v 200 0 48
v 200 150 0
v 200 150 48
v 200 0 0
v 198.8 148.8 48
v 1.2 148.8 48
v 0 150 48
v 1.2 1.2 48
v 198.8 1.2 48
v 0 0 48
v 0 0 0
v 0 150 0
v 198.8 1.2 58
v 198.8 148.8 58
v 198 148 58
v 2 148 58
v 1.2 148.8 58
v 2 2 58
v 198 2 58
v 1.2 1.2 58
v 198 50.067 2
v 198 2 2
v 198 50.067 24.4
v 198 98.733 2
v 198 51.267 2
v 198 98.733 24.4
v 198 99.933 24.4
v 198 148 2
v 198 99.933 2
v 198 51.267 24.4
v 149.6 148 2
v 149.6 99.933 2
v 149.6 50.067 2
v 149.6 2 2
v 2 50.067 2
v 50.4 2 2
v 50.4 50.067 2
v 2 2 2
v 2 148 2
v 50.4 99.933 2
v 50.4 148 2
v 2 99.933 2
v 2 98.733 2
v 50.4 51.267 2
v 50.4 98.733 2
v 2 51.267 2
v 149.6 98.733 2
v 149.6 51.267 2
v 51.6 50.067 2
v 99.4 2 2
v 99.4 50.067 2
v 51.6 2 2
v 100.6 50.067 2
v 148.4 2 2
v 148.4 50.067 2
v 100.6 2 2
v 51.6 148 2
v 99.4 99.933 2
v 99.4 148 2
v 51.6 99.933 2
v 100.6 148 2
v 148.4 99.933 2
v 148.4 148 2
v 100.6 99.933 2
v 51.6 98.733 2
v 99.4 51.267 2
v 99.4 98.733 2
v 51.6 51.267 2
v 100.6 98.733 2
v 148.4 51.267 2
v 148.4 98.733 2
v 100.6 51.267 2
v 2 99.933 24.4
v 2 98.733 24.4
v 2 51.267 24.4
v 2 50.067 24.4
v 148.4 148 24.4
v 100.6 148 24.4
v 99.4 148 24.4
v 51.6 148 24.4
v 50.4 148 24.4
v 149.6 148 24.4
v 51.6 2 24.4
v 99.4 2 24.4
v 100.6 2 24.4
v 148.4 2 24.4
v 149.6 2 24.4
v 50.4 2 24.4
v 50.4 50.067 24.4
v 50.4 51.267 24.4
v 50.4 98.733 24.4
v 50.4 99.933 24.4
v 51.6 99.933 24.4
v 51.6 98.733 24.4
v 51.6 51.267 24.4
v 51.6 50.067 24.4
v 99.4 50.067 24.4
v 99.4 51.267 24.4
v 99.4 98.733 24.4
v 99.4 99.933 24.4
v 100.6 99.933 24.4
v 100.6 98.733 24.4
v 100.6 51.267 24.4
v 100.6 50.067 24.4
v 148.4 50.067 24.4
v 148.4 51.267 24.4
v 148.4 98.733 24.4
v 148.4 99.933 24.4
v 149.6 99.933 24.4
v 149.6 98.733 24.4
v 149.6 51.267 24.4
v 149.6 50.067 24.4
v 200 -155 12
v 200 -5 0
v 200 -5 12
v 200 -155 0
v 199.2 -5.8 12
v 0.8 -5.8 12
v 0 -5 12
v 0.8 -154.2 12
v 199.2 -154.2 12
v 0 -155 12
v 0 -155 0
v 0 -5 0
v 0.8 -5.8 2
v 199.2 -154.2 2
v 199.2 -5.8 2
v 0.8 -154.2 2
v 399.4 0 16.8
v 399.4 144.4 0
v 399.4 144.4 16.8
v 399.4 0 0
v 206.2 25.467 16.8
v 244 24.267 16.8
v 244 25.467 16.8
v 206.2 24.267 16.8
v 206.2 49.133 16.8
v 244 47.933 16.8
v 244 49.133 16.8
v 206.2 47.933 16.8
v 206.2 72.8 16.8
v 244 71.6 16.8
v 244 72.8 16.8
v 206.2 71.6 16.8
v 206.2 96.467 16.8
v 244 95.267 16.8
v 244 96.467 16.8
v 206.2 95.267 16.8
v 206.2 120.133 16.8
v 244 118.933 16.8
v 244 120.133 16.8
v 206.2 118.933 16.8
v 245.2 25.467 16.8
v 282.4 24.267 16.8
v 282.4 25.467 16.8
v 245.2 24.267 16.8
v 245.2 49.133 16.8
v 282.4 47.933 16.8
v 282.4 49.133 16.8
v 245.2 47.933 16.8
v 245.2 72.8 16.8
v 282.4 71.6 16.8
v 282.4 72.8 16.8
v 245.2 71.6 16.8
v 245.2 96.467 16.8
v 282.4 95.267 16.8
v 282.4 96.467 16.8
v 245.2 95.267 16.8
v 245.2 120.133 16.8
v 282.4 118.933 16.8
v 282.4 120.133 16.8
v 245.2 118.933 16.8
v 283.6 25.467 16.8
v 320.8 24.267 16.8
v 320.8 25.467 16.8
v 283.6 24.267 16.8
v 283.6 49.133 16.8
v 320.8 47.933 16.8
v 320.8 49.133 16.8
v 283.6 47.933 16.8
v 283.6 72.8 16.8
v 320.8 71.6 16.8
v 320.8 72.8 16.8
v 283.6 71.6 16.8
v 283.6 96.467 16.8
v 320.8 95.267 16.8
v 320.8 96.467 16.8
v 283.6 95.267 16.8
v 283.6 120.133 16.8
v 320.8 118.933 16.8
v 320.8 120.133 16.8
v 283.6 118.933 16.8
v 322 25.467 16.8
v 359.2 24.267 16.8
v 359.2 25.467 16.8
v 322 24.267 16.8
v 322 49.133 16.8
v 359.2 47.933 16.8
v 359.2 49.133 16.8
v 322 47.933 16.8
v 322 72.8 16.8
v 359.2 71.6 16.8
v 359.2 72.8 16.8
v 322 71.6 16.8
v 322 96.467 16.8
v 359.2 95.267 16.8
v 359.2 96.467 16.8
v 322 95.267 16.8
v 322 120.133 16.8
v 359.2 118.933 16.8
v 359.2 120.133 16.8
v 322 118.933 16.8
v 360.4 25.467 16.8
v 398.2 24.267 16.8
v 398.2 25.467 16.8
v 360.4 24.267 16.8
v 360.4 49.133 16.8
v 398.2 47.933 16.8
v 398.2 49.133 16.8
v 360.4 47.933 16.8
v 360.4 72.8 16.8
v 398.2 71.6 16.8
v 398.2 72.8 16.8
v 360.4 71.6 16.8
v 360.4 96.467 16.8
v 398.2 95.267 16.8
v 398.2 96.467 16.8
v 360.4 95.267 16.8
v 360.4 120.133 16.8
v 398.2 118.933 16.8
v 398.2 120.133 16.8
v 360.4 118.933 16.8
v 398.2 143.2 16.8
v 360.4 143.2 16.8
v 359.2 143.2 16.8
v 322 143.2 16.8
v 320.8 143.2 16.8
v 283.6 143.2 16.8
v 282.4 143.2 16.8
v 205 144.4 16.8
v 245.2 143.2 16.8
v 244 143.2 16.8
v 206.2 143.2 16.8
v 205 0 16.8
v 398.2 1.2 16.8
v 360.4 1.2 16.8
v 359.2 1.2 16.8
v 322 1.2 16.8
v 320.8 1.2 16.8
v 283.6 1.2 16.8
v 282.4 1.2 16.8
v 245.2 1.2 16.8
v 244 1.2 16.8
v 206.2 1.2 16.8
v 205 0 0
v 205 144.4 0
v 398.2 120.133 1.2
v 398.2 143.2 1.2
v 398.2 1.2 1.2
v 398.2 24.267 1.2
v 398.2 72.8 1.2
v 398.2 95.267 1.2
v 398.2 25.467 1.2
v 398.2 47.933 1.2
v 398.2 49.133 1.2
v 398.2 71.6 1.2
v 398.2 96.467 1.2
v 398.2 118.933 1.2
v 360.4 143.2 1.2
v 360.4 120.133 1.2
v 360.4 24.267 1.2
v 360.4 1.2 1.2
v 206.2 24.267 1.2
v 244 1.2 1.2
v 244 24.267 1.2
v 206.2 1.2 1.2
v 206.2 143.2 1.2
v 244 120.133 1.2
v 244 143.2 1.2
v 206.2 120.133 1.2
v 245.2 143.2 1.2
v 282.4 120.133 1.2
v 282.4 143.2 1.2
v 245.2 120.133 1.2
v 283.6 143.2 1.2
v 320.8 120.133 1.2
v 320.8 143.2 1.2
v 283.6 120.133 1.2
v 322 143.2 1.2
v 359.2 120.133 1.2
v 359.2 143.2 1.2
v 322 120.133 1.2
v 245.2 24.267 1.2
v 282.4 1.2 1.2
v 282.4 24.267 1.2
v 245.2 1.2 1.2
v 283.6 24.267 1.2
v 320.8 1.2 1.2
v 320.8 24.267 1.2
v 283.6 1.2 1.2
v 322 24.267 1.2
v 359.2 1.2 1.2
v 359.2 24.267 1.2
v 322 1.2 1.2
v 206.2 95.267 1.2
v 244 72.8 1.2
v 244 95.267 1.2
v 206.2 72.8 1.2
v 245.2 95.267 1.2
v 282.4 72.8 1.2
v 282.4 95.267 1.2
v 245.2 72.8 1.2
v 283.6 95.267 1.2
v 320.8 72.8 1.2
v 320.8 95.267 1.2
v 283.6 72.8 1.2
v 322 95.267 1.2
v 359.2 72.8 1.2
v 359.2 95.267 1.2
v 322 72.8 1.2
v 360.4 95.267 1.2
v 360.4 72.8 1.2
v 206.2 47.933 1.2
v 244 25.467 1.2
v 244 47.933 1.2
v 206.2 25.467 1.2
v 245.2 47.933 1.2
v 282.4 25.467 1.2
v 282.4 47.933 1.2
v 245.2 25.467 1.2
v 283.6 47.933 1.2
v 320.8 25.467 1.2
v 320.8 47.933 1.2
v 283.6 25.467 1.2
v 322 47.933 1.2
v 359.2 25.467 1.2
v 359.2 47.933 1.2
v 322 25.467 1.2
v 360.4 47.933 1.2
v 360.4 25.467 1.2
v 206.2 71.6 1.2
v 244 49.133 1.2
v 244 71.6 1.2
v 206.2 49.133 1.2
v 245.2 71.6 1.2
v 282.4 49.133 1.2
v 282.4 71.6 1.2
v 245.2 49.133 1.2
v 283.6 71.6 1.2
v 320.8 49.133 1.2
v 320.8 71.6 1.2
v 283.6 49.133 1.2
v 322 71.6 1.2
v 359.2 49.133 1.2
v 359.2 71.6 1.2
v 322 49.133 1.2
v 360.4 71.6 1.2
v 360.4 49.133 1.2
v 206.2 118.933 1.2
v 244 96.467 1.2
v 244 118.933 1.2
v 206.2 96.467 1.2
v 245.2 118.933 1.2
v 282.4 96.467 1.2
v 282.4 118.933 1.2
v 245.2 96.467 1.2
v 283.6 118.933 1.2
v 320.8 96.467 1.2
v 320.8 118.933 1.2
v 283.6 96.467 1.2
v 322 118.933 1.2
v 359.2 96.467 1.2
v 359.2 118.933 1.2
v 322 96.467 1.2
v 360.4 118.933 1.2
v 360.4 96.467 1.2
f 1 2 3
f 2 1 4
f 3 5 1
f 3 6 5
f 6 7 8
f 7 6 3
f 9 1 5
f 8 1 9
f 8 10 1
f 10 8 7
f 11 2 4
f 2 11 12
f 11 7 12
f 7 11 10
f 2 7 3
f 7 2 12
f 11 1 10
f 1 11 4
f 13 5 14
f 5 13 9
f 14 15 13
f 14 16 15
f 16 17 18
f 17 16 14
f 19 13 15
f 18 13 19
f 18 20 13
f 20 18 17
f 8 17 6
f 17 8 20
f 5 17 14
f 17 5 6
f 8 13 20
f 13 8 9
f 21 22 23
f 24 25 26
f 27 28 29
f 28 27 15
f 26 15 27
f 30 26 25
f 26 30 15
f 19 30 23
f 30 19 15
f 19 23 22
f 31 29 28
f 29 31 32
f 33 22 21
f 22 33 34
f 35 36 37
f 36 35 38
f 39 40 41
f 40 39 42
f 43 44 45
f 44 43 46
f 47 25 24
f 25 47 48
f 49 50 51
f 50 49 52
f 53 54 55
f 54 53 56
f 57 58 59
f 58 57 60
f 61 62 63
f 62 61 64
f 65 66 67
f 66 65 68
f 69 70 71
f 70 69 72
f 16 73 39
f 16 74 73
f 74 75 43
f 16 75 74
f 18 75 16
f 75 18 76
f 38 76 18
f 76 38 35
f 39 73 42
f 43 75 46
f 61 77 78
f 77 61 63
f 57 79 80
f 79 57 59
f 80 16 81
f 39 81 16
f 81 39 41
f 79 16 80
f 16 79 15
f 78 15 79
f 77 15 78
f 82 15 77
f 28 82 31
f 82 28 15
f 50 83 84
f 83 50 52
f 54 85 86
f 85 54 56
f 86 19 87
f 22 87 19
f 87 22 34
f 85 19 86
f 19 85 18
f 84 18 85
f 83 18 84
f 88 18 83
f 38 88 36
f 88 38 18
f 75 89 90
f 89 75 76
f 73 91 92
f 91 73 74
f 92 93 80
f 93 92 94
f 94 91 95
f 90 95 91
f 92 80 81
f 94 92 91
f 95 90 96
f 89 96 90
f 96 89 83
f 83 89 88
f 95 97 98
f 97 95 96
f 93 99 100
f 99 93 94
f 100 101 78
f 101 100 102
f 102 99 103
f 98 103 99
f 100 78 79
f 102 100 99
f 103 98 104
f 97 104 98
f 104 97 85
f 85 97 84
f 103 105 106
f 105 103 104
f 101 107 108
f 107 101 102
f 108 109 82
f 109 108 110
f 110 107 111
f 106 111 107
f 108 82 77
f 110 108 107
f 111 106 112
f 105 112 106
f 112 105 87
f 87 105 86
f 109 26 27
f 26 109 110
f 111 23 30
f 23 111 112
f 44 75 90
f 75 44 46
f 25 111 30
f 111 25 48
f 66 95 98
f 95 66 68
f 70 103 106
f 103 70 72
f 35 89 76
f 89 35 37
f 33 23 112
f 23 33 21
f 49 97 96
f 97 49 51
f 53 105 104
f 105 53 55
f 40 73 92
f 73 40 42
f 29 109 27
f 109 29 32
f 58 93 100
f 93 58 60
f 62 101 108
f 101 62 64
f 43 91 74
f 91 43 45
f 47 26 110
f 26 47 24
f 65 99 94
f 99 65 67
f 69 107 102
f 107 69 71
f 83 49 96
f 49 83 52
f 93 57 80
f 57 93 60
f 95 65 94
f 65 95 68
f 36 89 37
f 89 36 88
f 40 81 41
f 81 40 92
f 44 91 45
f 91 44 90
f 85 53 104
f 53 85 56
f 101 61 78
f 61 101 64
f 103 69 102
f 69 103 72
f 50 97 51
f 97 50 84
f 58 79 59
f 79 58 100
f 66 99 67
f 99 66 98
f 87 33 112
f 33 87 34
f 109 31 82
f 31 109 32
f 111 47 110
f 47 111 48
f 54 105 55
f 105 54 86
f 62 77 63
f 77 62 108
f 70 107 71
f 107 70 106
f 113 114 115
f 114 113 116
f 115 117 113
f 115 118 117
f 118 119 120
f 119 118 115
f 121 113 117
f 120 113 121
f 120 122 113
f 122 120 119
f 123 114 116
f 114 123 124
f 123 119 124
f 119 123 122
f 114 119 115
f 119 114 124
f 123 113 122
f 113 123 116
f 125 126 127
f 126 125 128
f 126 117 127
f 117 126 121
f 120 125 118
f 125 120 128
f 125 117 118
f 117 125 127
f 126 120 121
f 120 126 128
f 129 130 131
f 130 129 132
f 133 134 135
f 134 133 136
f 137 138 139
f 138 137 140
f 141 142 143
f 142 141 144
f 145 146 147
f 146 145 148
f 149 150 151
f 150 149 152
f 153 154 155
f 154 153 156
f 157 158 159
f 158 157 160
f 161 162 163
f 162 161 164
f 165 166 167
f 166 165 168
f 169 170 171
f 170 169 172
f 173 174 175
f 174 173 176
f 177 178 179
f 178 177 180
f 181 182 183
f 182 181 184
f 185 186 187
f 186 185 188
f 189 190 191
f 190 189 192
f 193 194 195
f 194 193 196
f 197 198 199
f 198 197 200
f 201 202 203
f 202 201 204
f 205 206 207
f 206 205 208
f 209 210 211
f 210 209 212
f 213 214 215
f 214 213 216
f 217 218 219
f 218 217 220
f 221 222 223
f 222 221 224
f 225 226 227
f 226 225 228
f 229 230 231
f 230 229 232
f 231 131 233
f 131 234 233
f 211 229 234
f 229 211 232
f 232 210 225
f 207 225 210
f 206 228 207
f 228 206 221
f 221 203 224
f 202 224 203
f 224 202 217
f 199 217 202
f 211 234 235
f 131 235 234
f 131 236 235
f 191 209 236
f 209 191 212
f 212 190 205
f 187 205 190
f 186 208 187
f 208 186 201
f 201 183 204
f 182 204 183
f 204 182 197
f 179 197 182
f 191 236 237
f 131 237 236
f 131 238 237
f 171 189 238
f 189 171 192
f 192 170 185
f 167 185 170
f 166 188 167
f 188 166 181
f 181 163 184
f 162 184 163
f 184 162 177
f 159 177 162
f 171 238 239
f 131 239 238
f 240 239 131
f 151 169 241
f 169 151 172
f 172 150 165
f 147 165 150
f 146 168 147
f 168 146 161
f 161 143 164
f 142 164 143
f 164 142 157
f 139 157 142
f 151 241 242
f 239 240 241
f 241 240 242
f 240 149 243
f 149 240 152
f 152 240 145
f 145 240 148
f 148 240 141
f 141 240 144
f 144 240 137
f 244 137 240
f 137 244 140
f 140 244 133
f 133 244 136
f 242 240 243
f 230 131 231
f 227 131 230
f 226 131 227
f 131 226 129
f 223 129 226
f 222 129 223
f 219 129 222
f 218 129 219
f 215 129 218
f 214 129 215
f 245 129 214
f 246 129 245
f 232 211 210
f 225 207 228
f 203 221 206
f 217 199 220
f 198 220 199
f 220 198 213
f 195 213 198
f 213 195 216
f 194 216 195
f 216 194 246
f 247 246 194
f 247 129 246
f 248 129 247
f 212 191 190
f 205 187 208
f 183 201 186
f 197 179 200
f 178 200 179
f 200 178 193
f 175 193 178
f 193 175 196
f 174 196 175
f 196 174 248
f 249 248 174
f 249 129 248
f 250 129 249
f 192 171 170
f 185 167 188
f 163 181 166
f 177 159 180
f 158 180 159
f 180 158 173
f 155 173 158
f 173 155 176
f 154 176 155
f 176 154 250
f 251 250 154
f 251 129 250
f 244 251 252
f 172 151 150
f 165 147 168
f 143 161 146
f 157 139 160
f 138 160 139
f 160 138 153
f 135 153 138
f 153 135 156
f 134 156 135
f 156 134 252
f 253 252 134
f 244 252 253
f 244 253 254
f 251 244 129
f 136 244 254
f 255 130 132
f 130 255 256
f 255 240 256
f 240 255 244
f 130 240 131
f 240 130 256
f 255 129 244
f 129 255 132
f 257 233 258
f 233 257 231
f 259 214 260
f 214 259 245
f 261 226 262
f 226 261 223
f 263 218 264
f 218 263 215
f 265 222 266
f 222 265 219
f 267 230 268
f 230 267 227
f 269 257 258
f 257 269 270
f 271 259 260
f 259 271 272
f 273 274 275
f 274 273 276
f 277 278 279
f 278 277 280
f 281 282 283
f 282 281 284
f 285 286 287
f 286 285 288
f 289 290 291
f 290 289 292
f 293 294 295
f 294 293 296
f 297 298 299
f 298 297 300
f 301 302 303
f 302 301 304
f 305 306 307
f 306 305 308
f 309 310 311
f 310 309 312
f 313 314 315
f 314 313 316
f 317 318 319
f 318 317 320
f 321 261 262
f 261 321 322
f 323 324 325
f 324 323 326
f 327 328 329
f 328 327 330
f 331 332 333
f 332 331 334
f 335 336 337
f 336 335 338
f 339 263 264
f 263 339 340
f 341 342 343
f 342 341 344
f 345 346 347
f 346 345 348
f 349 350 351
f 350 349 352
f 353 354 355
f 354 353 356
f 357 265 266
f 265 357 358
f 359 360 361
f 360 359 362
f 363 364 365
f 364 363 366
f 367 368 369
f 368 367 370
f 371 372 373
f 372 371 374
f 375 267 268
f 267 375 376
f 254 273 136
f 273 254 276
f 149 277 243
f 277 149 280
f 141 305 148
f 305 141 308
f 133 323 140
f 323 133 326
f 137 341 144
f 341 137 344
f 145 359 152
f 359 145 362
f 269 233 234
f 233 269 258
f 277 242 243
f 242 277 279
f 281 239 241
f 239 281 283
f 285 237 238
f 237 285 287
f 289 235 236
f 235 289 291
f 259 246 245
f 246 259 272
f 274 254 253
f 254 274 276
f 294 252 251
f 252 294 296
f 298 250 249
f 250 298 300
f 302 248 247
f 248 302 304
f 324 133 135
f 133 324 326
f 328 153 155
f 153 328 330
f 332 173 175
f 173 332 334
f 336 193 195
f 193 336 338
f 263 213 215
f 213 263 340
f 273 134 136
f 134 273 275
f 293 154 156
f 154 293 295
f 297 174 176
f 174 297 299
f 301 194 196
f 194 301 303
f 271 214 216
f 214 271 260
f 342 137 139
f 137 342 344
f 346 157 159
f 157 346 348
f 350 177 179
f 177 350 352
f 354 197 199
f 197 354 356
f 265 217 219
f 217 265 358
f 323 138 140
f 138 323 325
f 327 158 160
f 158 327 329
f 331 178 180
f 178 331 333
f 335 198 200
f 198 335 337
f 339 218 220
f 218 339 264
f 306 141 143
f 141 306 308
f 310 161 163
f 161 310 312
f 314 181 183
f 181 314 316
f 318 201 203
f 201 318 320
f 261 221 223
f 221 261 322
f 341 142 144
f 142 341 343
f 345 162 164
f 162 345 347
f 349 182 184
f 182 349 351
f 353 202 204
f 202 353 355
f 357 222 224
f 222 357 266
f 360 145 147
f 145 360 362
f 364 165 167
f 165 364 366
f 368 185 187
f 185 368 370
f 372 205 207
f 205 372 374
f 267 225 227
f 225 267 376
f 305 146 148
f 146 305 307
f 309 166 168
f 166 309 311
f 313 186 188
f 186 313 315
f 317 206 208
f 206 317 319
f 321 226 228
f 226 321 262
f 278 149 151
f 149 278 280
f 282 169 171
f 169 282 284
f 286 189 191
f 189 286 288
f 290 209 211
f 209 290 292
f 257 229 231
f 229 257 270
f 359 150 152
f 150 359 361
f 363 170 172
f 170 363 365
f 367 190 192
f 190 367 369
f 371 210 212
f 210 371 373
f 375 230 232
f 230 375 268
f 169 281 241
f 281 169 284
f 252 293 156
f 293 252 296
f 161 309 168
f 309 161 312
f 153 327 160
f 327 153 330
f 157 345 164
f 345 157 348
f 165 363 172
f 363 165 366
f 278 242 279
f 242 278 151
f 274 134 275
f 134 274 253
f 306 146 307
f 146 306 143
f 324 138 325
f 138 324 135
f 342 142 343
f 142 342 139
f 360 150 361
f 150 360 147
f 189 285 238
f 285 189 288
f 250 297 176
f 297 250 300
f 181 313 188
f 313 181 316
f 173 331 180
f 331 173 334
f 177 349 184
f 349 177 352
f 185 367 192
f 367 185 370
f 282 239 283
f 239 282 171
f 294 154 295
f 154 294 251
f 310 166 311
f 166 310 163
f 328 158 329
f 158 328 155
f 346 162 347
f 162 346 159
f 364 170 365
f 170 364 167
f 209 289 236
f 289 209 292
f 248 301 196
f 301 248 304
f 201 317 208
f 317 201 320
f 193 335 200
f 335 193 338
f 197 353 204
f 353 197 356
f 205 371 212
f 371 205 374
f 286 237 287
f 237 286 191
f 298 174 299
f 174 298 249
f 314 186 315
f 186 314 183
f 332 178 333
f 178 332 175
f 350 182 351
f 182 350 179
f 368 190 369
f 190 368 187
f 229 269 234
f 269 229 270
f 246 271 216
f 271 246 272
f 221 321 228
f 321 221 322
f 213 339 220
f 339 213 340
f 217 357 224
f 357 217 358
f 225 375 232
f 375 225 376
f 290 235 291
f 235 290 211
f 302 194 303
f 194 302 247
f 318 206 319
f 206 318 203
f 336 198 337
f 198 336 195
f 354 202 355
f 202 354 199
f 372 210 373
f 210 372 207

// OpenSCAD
//-------------------------------------
// Title:             Box MkII
// Version:        1.1.0
// Date:            2019-05-23
// Designer:      Steve Cooper
//-------------------------------------
//
// Tolerance will need to be amended depending on how accurate the printer is and also how tight a fit is required.  Default values work quite well for my setup.
//Update 1.1.0 - Added option to add corners to support inserts if dividers on base box not being used and to change the layout of the dividers in box and insert

/* [Box Structure] */
// Which one would you like to see?
part = "all"; // [box:Box Only,lid:Lid Only,insert:Insert only,boxandlid:Box and Lid,All:All 3]
//width of whole main box
x = 200;
//depth of whole main box
y = 150;
//height of whole main box
z = 60;
//thickness of outside edge (needs to be thick enough for lip)
edge = 2;
lipw = edge/2;


/* [Lid Details] */
//height of lip
liph = 10;
//Additional internal height above lip
lidaddheight = 0;
//tolerance of the lip join - this is tolerance on each edge
tol = 0.4;
piecetol = tol /2;  //Apply equal tolerance to lid and box

/* [Compartments] */
//Number of x compartments
comp_x = 4;
//Number of y compartments
comp_y = 3;
//Percentage Height of compartments
comp_perc = 40; //[1:1:100]
//Width of compartment borders
comp_border=1.2;
//add insert supports
insertsupports=0;    //  [ 0:No, 1:Yes ]


/* [Insert] */
//Number of x compartments in insert
insert_comp_x = 5;
//Number of y compartments in insert
insert_comp_y = 6;
//Percentage Height of insert compared to base
insert_perc = 30; //[1:1:100]
//Width of insert borders
insert_border=1.2;
//Width of insert dividers
insert_divider=1.2;
//clearance for insert - this is tolerance on each edge
insert_tolerance=0.8;


/* [Box and Insert Custom Divider Layouts] */

//custom layout, set value to 1 if you want that border in place
customboxx=[1];
//For a x=4 and y=3 you would have 8 X values and 9 Y values, set both value to [1] for all borders
customboxy=[1];

//custom insert layout, set value to 1 if you want that border in place
custominsertx=[1];
//For a x=4 and y=3 you would have 8 X values and 9 Y values, set both value to [1] for all borders
custominserty=[1];

/* [Hidden] */
//used to give clean rendering
epsilon = 0.01;
//Adjust box to get true whole box dimensions
boxz = z - (edge+lidaddheight);
//Internal x and y dimensions for compartments
intx = x-2*edge;
intstepx = intx / comp_x;
inty = y-2*edge;
intstepy = inty /comp_y;
intz = (boxz-edge)*(comp_perc/100);
//Internals for insert
insertx= intx-2*insert_tolerance;
insertstepx = (insertx-2*insert_border)/insert_comp_x;
inserty= inty-2*insert_tolerance;
insertstepy = (inserty-2*insert_border)/insert_comp_y;
insertz=(boxz-edge)*(insert_perc/100);


module box(){
difference() 
    {
        union()
        {   
            translate(v=[0,0,0]) 
                {
                    cube(size=[x,y,boxz-liph], center=false);
                }
            translate(v=[lipw+piecetol,lipw+piecetol,0]) 
                {
                    cube(size=[x-(2*(lipw+piecetol)),y-(2*(lipw+piecetol)),boxz], center=false);
                }
        }
        translate(v=[edge,edge,edge]) 
            {
                cube(size=[x-(edge*2),y-(edge*2),boxz-edge+epsilon], center=false);
            }
    }
    
//Custom structures
    if (comp_x>1){
        if (comp_y>1){
            for(y1=[1:comp_y-1],x1=[1:comp_x]){
                count = (y1-1)*comp_x+x1-1;
                if(customboxx[count]==1 || customboxx[count]==undef){
                    translate([(intstepx*(x1-1))+edge-comp_border/2,intstepy*(y1)+edge-comp_border/2,edge]) 
                        cube(size=[intstepx+comp_border,comp_border,intz]);
                }
            }
        }
        else {
            //Need to account for when y comp = 1
            for(x1=[1:comp_x]){
                count = x1-1;
                if(customboxx[count]==1 || customboxx[count]==undef){
                    translate([(intstepx*(x1-1))+edge-comp_border/2,(inty/2)+edge-comp_border/2,edge]) 
                        cube(size=[intstepx+comp_border,comp_border,intz]);
                }
            }
        }
    }

    if (comp_y>1){    
        if(comp_x>1){
            for(x1=[1:comp_x-1],y1=[1:comp_y]){
                count = (x1-1)*comp_y+y1-1;
                if(customboxy[count]==1 || customboxy[count]==undef){
                    translate([(intstepx*(x1))+edge-comp_border/2,intstepy*(y1-1)+edge-comp_border/2,edge]) 
                        cube(size=[comp_border,intstepy+comp_border,intz]);
                }
            }
        }
        else {
            //Need to account for when x comp = 1
            for(y1=[1:comp_y]){
                count = y1-1;
                if(customboxy[count]==1 || customboxy[count]==undef){
                    translate([intstepx/2+edge-comp_border/2,intstepy*(y1-1)+edge-comp_border/2,edge]) 
                        cube(size=[comp_border,intstepy+comp_border,intz]);
                }
            }
        }
    }        

        
    if (insertsupports){
            translate([edge,edge,edge])linear_extrude(height=intz)polygon(points=[[0,0],[0,4],[4,0]]);
            translate([x-edge,edge,edge])rotate([0,0,90])linear_extrude(height=intz)polygon(points=[[0,0],[0,4],[4,0]]);
            translate([x-edge,y-edge,edge])rotate([0,0,180])linear_extrude(height=intz)polygon(points=[[0,0],[0,4],[4,0]]);
            translate([edge,y-edge,edge])rotate([0,0,-90])linear_extrude(height=intz)polygon(points=[[0,0],[0,4],[4,0]]);
    }
    
}

module lid(){
difference()
    {
        //main lid
        translate(v=[0,0,0]) 
                {
                    cube(size=[x,y,liph+edge+lidaddheight], center=false);
                }
       //additional height cutout
       translate(v=[edge,edge,edge]) 
            {
                cube(size=[x-(2*edge),y-(2*edge),lidaddheight+epsilon], center=false);
            }                
         //lip cutout   
         translate(v=[edge-lipw-piecetol,edge-lipw-piecetol,edge+lidaddheight]) 
            {
                cube(size=[x-2*(lipw-piecetol),y-2*(lipw-piecetol),liph+epsilon], center=false);
            }
        }
    }
    
    
module insert(){
difference() 
    {
            translate(v=[0,0,0]) 
                {
                    cube(size=[insertx,inserty,insertz], center=false);
                }
        translate(v=[insert_border,insert_border,insert_border]) 
            {
                cube(size=[insertx-(insert_border*2),inserty-(insert_border*2),insertz-insert_border+epsilon], center=false);
            }
    }
    
 //   if (insert_comp_x>1){
 //       for (i=[1:insert_comp_x-1]){
 //           translate([(insertstepx*i)+insert_border-insert_divider/2,insert_border,0])
 //           cube(size=[insert_divider,inserty-2*insert_border,insertz]);
 //       }
 //       }
 //   if (insert_comp_y>1){        
 //       for (i=[1:insert_comp_y-1]){
 //           translate([insert_border,(insertstepy*i)+insert_border-insert_divider/2,0])
 //           cube(size=[insertx-2*insert_border,insert_divider,insertz]);
  //      }
  //      }   
 
 //Custom structures
    if (insert_comp_x>1){
        if (insert_comp_y>1){
            for(y1=[1:insert_comp_y-1],x1=[1:insert_comp_x]){
                count = (y1-1)*insert_comp_x+x1-1;
                if(custominsertx[count]==1 || custominsertx[count]==undef){
                    translate([(insertstepx*(x1-1))+insert_border-insert_divider/2,insertstepy*(y1)+insert_border-insert_divider/2,insert_border]) 
                        cube(size=[insertstepx+insert_divider,insert_divider,insertz-insert_border]);
                }
            }
        }
        else {
            //Need to account for when y comp = 1
            for(x1=[1:insert_comp_x]){
                count = x1-1;
                if(custominsertx[count]==1 || custominsertx[count]==undef){
                    translate([(insertstepx*(x1-1))+insert_border-insert_divider/2,(inty/2)+insert_border-insert_divider/2,insert_border]) 
                        cube(size=[insertstepx+insert_divider,insert_divider,insertz-insert_border]);
                }
            }
        }
    }

    if (insert_comp_y>1){    
        if(comp_x>1){
            for(x1=[1:insert_comp_x-1],y1=[1:insert_comp_y]){
                count = (x1-1)*insert_comp_y+y1-1;
                if(custominserty[count]==1 || custominserty[count]==undef){
                    translate([(insertstepx*(x1))+insert_border-insert_divider/2,insertstepy*(y1-1)+insert_border-insert_divider/2,insert_border]) 
                        cube(size=[insert_divider,insertstepy+insert_divider,insertz-insert_border]);
                }
            }
        }
        else {
            //Need to account for when x comp = 1
            for(y1=[1:insert_comp_y]){
                count = y1-1;
                if(custominserty[count]==1 || custominserty[count]==undef){
                    translate([insertstepx/2+insert_border-insert_divider/2,insertstepy*(y1-1)+insert_border-insert_divider/2,insert_border]) 
                        cube(size=[insert_divider,insertstepy+insert_divider,insertz-insert_border]);
                }
            }
        }
    }     
        
    
}    

module print_part() {
	if (part == "box") {
		box();
	} else if (part == "lid") {
		lid();
	} else if (part == "insert") {
		insert();
    } else if (part == "boxandlid") {
		box();
        translate([0,-y-5,0]) lid();
	} else {  //all
		box();
        translate([0,-y-5,0]) lid();
        translate([x+5,0,0]) insert();
	}
}

print_part();
